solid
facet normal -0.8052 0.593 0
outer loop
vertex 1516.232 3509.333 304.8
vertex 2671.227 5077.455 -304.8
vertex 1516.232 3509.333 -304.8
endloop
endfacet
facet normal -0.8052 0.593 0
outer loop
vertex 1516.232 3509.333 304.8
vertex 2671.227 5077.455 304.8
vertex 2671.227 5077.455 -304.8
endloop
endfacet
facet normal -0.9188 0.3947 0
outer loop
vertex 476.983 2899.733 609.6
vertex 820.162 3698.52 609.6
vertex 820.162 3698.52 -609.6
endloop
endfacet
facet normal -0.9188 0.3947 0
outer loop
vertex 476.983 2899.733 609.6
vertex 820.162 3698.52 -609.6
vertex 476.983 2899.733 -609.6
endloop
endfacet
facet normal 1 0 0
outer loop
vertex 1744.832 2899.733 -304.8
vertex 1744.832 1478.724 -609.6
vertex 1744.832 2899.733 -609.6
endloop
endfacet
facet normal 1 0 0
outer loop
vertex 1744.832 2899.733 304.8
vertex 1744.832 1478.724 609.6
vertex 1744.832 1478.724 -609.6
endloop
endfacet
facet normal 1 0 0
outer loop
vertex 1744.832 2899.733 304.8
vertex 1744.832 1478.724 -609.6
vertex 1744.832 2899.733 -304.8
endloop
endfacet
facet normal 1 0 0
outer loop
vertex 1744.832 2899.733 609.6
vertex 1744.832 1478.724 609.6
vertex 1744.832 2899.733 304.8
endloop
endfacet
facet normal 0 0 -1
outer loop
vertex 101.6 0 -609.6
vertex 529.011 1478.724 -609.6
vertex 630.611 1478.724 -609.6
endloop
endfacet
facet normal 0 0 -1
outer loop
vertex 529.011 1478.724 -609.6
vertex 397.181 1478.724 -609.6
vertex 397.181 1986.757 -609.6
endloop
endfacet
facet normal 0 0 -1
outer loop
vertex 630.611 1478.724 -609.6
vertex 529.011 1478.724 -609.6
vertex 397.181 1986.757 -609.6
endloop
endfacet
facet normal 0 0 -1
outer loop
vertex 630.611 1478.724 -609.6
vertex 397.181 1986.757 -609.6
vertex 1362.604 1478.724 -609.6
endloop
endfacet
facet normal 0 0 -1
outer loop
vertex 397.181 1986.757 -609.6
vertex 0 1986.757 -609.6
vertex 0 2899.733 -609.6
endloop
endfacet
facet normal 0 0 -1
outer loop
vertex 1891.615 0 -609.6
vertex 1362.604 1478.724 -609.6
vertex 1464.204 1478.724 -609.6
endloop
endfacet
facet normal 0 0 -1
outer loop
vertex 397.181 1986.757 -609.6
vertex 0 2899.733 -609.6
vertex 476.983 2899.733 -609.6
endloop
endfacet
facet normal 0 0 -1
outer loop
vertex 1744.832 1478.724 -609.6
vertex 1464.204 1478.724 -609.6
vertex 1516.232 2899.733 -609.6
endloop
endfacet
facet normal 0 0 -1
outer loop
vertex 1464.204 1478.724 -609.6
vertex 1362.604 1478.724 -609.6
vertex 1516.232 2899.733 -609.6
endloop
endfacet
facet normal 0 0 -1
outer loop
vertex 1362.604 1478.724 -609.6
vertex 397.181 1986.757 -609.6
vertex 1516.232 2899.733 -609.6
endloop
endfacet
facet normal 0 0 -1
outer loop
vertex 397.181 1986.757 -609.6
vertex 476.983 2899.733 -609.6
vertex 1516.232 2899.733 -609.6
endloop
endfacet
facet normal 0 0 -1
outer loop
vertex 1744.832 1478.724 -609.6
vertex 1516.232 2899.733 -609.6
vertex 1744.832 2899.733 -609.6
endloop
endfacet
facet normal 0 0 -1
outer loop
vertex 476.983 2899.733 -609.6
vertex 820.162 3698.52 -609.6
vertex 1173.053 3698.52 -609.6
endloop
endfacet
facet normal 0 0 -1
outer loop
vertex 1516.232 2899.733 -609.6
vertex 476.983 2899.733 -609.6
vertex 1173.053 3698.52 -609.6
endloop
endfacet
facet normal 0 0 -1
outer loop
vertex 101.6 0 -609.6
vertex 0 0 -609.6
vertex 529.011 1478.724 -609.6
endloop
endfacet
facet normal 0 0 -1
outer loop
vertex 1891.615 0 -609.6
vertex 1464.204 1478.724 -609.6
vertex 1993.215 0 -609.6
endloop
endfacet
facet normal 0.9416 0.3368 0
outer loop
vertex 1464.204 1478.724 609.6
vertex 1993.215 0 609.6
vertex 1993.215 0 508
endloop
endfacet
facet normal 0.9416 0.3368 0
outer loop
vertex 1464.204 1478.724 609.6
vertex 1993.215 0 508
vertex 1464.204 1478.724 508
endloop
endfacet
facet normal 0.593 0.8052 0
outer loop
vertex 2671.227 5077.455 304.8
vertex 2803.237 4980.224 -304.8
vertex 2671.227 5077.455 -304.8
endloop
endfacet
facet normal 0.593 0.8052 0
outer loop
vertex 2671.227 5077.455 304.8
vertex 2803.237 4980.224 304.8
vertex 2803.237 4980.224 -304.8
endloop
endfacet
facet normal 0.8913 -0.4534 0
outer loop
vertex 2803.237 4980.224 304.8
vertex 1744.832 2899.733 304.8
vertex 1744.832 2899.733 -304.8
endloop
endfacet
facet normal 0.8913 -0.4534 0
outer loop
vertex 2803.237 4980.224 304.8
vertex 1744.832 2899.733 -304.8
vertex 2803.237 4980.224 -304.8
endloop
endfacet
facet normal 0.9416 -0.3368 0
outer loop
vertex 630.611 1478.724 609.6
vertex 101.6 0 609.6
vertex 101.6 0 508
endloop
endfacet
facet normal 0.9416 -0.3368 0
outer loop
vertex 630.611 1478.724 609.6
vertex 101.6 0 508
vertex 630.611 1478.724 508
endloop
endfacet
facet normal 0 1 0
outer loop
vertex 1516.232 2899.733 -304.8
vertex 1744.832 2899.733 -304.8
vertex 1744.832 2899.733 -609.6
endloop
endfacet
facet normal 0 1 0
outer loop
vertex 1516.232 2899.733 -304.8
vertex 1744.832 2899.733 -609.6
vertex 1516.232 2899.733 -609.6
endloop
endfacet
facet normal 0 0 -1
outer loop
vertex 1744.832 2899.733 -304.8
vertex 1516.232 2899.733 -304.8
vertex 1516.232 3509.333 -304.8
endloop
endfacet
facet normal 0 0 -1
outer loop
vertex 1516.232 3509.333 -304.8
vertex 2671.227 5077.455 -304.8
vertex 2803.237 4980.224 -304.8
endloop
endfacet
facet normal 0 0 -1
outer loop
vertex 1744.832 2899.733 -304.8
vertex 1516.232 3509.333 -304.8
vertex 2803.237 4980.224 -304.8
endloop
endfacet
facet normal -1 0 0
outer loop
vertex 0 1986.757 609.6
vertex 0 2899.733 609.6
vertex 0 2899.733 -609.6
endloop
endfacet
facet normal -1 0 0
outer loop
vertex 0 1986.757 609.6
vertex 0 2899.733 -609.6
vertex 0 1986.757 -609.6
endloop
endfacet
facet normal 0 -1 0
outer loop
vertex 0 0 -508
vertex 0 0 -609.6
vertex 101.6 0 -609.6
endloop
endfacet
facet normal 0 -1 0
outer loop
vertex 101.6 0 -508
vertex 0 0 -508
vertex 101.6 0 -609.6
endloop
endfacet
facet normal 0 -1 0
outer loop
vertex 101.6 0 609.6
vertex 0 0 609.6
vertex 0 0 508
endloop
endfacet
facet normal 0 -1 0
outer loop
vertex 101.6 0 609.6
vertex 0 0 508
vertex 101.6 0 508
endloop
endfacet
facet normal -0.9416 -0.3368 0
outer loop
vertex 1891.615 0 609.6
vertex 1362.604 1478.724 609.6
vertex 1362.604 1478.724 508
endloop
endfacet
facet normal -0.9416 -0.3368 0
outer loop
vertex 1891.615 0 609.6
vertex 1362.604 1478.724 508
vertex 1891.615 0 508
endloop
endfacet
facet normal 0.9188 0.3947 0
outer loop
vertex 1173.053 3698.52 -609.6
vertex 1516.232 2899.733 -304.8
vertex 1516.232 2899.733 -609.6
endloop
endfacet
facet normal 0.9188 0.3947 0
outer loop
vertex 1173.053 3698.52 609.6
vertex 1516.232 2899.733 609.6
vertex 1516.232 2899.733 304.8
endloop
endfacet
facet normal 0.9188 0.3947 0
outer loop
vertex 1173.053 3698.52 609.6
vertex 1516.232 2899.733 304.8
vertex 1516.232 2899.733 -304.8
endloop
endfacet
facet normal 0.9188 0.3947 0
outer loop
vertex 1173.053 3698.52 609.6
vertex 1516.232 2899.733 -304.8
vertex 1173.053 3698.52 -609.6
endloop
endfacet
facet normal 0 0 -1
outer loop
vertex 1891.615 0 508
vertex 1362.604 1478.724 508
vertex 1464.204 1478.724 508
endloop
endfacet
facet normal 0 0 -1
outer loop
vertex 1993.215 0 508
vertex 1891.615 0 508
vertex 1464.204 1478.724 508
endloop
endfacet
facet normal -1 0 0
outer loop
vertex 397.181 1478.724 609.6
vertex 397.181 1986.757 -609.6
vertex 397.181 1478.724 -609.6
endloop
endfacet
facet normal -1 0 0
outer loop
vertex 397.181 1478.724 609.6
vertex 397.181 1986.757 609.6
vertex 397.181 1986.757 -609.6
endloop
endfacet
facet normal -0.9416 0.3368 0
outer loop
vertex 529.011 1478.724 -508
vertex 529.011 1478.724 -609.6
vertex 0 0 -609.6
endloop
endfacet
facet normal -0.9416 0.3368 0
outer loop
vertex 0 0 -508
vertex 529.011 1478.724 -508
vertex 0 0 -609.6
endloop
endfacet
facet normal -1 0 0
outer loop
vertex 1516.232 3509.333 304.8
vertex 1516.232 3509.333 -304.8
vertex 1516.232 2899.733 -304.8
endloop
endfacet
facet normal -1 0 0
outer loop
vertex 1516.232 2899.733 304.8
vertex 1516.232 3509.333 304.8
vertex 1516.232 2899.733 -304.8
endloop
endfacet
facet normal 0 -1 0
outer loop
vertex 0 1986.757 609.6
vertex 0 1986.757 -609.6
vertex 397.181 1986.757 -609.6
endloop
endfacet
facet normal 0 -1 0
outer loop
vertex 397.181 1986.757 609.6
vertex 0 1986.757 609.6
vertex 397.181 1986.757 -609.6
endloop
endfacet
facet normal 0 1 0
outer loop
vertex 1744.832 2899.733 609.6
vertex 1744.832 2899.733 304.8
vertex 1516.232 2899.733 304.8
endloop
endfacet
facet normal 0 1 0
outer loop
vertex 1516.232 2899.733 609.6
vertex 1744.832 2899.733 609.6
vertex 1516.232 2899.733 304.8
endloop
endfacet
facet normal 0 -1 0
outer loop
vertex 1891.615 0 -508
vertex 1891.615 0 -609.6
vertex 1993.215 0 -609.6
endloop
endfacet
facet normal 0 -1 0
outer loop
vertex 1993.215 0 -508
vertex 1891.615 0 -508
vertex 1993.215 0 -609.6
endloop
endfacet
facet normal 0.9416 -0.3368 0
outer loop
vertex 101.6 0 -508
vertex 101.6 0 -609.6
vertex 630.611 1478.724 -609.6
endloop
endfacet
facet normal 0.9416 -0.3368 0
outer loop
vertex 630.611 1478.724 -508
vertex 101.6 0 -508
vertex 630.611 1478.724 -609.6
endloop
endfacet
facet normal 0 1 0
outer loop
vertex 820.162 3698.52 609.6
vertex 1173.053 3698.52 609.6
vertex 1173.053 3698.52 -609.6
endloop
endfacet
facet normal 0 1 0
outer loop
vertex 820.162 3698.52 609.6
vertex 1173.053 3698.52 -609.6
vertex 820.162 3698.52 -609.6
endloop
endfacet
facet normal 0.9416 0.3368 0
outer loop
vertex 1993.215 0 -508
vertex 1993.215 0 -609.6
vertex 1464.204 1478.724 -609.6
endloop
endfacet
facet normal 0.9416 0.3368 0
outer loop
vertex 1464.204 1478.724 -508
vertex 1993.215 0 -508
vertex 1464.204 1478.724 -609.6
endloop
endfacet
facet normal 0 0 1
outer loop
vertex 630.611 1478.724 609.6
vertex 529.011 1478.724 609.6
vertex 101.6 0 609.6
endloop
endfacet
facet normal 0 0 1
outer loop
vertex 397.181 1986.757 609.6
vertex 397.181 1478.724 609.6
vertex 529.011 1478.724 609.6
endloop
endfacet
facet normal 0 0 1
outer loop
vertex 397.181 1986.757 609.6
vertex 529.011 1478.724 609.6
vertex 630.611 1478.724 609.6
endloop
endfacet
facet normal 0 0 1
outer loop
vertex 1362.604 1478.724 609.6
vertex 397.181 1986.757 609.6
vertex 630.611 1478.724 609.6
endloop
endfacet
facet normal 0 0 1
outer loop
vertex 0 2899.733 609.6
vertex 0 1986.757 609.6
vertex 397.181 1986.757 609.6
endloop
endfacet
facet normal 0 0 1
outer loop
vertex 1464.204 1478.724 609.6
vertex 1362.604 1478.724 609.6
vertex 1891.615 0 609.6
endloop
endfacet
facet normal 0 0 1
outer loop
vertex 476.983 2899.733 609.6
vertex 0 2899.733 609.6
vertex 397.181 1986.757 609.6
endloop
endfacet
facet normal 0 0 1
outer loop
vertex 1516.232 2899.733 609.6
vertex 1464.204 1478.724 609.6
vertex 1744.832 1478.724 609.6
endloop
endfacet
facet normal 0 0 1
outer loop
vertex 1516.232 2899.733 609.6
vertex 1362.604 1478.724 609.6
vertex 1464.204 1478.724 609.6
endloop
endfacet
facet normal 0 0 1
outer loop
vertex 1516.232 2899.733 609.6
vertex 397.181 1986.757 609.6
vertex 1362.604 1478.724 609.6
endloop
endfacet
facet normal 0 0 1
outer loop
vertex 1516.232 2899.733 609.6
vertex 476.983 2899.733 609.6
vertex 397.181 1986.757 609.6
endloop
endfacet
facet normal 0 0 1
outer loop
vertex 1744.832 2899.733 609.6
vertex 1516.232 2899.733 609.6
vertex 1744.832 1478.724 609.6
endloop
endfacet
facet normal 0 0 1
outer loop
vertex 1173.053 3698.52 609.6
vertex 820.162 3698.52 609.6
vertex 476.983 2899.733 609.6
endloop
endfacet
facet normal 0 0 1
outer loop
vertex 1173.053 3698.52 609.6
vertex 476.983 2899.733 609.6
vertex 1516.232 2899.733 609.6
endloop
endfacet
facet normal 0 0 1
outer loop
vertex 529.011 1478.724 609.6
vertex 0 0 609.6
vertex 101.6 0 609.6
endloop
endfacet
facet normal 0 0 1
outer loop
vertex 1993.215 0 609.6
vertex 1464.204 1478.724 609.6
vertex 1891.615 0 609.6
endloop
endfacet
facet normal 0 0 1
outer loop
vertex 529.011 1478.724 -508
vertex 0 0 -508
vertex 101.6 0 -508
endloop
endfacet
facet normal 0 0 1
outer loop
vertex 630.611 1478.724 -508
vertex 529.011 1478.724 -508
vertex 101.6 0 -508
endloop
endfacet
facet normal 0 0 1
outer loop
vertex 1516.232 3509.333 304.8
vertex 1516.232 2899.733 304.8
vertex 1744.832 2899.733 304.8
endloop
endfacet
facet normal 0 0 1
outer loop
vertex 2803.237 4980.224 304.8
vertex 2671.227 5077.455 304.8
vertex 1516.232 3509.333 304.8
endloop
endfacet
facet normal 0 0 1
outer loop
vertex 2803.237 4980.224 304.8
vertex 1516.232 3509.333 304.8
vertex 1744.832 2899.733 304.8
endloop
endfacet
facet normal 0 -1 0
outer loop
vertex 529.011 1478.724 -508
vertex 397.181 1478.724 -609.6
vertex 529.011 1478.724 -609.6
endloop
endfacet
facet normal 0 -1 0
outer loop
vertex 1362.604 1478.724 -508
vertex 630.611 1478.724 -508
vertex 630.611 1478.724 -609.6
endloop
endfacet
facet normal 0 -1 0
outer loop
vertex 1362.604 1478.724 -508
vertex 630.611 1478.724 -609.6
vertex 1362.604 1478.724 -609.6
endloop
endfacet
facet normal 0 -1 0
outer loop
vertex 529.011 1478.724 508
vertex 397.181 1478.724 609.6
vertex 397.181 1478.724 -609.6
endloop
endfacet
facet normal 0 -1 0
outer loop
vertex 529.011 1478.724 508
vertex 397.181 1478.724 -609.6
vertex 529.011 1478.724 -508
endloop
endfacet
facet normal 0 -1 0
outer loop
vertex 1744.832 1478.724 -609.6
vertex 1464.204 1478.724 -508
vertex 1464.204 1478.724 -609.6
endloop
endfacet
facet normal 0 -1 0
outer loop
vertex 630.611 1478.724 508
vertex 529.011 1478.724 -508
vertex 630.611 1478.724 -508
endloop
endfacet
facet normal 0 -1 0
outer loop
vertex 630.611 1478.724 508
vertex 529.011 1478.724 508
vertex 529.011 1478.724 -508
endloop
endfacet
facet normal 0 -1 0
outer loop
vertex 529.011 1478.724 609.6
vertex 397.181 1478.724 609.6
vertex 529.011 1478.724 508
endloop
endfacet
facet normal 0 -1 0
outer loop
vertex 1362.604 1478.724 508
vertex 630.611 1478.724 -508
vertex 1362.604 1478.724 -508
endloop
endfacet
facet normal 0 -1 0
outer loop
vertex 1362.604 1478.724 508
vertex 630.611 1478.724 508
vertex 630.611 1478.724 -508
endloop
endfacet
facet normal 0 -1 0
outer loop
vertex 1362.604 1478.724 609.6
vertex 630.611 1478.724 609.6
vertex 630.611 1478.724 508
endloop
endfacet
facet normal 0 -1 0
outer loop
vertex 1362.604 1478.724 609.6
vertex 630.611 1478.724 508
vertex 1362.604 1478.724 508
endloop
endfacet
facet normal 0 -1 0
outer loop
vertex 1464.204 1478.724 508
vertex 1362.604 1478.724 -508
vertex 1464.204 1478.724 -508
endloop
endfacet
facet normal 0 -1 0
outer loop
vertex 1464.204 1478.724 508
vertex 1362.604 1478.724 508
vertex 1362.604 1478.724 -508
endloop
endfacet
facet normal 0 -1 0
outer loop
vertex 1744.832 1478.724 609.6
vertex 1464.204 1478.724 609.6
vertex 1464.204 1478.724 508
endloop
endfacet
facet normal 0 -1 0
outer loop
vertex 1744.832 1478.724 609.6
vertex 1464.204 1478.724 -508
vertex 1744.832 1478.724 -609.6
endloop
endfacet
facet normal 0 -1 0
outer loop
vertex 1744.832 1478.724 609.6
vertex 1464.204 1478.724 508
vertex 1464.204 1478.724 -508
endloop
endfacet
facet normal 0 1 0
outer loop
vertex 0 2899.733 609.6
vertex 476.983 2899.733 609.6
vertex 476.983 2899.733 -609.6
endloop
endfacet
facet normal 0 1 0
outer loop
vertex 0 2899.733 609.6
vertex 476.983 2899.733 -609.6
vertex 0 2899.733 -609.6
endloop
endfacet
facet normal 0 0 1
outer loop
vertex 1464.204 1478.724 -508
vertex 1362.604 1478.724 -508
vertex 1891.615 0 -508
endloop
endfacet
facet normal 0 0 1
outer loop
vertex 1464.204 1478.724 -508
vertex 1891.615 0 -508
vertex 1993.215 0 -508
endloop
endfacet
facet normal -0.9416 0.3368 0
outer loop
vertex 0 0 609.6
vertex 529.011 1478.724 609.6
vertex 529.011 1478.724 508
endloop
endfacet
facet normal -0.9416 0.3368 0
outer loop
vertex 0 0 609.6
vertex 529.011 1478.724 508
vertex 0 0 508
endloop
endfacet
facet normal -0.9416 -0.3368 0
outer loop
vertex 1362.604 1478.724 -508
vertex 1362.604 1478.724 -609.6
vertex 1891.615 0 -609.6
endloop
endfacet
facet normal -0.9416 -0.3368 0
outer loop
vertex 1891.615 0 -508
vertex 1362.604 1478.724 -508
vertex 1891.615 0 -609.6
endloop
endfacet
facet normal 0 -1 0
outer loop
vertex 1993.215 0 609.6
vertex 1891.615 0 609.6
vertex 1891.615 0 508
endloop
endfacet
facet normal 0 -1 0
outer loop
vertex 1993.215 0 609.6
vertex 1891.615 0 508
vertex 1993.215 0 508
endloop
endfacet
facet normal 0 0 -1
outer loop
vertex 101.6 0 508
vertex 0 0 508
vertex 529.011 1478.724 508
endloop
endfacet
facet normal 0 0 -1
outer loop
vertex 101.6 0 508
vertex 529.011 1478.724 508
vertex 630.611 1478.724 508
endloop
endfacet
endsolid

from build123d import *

# Parameters (mm, degrees)
BOSS_EXTRUDE1_DEPTH = 609.6
BOSS_EXTRUDE2_DEPTH = 304.8
BOSS_EXTRUDE3_DEPTH = 101.6


with BuildPart() as part:
    # Sketch2 → Boss-Extrude1 (new, symmetric)
    with BuildSketch(Plane.XY):
        Polygon((397.181123676, 1478.724407172), (1744.83154289, 1478.724407172), (1744.83154289, 2899.732664245), (1516.23154289, 2899.732664245), (1173.053103307, 3698.520098923), (820.161879734, 3698.520098923), (476.983440152, 2899.732664245), (0, 2899.732664245), (0, 1986.756947693), (397.181123676, 1986.756947693), align=None)
    extrude(amount=BOSS_EXTRUDE1_DEPTH, both=True)

    # Sketch3 → Boss-Extrude2 (add, symmetric)
    with BuildSketch(Plane.XY):
        Polygon((1516.23154289, 3509.332664245), (1516.23154289, 2899.732664245), (1744.83154289, 2899.732664245), (2803.237053345, 4980.22399095), (2671.227131095, 5077.455456827), align=None)
    extrude(amount=BOSS_EXTRUDE2_DEPTH, both=True)

    # Sketch4 → Boss-Extrude3 (add)
    with BuildSketch(Plane.XY.offset(609.6)):
        Polygon((529.010881251, 1478.724407172), (0, 0), (101.6, 0), (630.610881251, 1478.724407172), align=None)
        Polygon((1464.20410179, 1478.724407172), (1362.60410179, 1478.724407172), (1891.614983041, 0), (1993.214983041, 0), align=None)
    boss_extrude3 = extrude(amount=-BOSS_EXTRUDE3_DEPTH)

    # Mirror1: Boss-Extrude3 across plane
    add(boss_extrude3.mirror(Plane.XY))


solid = part.part
